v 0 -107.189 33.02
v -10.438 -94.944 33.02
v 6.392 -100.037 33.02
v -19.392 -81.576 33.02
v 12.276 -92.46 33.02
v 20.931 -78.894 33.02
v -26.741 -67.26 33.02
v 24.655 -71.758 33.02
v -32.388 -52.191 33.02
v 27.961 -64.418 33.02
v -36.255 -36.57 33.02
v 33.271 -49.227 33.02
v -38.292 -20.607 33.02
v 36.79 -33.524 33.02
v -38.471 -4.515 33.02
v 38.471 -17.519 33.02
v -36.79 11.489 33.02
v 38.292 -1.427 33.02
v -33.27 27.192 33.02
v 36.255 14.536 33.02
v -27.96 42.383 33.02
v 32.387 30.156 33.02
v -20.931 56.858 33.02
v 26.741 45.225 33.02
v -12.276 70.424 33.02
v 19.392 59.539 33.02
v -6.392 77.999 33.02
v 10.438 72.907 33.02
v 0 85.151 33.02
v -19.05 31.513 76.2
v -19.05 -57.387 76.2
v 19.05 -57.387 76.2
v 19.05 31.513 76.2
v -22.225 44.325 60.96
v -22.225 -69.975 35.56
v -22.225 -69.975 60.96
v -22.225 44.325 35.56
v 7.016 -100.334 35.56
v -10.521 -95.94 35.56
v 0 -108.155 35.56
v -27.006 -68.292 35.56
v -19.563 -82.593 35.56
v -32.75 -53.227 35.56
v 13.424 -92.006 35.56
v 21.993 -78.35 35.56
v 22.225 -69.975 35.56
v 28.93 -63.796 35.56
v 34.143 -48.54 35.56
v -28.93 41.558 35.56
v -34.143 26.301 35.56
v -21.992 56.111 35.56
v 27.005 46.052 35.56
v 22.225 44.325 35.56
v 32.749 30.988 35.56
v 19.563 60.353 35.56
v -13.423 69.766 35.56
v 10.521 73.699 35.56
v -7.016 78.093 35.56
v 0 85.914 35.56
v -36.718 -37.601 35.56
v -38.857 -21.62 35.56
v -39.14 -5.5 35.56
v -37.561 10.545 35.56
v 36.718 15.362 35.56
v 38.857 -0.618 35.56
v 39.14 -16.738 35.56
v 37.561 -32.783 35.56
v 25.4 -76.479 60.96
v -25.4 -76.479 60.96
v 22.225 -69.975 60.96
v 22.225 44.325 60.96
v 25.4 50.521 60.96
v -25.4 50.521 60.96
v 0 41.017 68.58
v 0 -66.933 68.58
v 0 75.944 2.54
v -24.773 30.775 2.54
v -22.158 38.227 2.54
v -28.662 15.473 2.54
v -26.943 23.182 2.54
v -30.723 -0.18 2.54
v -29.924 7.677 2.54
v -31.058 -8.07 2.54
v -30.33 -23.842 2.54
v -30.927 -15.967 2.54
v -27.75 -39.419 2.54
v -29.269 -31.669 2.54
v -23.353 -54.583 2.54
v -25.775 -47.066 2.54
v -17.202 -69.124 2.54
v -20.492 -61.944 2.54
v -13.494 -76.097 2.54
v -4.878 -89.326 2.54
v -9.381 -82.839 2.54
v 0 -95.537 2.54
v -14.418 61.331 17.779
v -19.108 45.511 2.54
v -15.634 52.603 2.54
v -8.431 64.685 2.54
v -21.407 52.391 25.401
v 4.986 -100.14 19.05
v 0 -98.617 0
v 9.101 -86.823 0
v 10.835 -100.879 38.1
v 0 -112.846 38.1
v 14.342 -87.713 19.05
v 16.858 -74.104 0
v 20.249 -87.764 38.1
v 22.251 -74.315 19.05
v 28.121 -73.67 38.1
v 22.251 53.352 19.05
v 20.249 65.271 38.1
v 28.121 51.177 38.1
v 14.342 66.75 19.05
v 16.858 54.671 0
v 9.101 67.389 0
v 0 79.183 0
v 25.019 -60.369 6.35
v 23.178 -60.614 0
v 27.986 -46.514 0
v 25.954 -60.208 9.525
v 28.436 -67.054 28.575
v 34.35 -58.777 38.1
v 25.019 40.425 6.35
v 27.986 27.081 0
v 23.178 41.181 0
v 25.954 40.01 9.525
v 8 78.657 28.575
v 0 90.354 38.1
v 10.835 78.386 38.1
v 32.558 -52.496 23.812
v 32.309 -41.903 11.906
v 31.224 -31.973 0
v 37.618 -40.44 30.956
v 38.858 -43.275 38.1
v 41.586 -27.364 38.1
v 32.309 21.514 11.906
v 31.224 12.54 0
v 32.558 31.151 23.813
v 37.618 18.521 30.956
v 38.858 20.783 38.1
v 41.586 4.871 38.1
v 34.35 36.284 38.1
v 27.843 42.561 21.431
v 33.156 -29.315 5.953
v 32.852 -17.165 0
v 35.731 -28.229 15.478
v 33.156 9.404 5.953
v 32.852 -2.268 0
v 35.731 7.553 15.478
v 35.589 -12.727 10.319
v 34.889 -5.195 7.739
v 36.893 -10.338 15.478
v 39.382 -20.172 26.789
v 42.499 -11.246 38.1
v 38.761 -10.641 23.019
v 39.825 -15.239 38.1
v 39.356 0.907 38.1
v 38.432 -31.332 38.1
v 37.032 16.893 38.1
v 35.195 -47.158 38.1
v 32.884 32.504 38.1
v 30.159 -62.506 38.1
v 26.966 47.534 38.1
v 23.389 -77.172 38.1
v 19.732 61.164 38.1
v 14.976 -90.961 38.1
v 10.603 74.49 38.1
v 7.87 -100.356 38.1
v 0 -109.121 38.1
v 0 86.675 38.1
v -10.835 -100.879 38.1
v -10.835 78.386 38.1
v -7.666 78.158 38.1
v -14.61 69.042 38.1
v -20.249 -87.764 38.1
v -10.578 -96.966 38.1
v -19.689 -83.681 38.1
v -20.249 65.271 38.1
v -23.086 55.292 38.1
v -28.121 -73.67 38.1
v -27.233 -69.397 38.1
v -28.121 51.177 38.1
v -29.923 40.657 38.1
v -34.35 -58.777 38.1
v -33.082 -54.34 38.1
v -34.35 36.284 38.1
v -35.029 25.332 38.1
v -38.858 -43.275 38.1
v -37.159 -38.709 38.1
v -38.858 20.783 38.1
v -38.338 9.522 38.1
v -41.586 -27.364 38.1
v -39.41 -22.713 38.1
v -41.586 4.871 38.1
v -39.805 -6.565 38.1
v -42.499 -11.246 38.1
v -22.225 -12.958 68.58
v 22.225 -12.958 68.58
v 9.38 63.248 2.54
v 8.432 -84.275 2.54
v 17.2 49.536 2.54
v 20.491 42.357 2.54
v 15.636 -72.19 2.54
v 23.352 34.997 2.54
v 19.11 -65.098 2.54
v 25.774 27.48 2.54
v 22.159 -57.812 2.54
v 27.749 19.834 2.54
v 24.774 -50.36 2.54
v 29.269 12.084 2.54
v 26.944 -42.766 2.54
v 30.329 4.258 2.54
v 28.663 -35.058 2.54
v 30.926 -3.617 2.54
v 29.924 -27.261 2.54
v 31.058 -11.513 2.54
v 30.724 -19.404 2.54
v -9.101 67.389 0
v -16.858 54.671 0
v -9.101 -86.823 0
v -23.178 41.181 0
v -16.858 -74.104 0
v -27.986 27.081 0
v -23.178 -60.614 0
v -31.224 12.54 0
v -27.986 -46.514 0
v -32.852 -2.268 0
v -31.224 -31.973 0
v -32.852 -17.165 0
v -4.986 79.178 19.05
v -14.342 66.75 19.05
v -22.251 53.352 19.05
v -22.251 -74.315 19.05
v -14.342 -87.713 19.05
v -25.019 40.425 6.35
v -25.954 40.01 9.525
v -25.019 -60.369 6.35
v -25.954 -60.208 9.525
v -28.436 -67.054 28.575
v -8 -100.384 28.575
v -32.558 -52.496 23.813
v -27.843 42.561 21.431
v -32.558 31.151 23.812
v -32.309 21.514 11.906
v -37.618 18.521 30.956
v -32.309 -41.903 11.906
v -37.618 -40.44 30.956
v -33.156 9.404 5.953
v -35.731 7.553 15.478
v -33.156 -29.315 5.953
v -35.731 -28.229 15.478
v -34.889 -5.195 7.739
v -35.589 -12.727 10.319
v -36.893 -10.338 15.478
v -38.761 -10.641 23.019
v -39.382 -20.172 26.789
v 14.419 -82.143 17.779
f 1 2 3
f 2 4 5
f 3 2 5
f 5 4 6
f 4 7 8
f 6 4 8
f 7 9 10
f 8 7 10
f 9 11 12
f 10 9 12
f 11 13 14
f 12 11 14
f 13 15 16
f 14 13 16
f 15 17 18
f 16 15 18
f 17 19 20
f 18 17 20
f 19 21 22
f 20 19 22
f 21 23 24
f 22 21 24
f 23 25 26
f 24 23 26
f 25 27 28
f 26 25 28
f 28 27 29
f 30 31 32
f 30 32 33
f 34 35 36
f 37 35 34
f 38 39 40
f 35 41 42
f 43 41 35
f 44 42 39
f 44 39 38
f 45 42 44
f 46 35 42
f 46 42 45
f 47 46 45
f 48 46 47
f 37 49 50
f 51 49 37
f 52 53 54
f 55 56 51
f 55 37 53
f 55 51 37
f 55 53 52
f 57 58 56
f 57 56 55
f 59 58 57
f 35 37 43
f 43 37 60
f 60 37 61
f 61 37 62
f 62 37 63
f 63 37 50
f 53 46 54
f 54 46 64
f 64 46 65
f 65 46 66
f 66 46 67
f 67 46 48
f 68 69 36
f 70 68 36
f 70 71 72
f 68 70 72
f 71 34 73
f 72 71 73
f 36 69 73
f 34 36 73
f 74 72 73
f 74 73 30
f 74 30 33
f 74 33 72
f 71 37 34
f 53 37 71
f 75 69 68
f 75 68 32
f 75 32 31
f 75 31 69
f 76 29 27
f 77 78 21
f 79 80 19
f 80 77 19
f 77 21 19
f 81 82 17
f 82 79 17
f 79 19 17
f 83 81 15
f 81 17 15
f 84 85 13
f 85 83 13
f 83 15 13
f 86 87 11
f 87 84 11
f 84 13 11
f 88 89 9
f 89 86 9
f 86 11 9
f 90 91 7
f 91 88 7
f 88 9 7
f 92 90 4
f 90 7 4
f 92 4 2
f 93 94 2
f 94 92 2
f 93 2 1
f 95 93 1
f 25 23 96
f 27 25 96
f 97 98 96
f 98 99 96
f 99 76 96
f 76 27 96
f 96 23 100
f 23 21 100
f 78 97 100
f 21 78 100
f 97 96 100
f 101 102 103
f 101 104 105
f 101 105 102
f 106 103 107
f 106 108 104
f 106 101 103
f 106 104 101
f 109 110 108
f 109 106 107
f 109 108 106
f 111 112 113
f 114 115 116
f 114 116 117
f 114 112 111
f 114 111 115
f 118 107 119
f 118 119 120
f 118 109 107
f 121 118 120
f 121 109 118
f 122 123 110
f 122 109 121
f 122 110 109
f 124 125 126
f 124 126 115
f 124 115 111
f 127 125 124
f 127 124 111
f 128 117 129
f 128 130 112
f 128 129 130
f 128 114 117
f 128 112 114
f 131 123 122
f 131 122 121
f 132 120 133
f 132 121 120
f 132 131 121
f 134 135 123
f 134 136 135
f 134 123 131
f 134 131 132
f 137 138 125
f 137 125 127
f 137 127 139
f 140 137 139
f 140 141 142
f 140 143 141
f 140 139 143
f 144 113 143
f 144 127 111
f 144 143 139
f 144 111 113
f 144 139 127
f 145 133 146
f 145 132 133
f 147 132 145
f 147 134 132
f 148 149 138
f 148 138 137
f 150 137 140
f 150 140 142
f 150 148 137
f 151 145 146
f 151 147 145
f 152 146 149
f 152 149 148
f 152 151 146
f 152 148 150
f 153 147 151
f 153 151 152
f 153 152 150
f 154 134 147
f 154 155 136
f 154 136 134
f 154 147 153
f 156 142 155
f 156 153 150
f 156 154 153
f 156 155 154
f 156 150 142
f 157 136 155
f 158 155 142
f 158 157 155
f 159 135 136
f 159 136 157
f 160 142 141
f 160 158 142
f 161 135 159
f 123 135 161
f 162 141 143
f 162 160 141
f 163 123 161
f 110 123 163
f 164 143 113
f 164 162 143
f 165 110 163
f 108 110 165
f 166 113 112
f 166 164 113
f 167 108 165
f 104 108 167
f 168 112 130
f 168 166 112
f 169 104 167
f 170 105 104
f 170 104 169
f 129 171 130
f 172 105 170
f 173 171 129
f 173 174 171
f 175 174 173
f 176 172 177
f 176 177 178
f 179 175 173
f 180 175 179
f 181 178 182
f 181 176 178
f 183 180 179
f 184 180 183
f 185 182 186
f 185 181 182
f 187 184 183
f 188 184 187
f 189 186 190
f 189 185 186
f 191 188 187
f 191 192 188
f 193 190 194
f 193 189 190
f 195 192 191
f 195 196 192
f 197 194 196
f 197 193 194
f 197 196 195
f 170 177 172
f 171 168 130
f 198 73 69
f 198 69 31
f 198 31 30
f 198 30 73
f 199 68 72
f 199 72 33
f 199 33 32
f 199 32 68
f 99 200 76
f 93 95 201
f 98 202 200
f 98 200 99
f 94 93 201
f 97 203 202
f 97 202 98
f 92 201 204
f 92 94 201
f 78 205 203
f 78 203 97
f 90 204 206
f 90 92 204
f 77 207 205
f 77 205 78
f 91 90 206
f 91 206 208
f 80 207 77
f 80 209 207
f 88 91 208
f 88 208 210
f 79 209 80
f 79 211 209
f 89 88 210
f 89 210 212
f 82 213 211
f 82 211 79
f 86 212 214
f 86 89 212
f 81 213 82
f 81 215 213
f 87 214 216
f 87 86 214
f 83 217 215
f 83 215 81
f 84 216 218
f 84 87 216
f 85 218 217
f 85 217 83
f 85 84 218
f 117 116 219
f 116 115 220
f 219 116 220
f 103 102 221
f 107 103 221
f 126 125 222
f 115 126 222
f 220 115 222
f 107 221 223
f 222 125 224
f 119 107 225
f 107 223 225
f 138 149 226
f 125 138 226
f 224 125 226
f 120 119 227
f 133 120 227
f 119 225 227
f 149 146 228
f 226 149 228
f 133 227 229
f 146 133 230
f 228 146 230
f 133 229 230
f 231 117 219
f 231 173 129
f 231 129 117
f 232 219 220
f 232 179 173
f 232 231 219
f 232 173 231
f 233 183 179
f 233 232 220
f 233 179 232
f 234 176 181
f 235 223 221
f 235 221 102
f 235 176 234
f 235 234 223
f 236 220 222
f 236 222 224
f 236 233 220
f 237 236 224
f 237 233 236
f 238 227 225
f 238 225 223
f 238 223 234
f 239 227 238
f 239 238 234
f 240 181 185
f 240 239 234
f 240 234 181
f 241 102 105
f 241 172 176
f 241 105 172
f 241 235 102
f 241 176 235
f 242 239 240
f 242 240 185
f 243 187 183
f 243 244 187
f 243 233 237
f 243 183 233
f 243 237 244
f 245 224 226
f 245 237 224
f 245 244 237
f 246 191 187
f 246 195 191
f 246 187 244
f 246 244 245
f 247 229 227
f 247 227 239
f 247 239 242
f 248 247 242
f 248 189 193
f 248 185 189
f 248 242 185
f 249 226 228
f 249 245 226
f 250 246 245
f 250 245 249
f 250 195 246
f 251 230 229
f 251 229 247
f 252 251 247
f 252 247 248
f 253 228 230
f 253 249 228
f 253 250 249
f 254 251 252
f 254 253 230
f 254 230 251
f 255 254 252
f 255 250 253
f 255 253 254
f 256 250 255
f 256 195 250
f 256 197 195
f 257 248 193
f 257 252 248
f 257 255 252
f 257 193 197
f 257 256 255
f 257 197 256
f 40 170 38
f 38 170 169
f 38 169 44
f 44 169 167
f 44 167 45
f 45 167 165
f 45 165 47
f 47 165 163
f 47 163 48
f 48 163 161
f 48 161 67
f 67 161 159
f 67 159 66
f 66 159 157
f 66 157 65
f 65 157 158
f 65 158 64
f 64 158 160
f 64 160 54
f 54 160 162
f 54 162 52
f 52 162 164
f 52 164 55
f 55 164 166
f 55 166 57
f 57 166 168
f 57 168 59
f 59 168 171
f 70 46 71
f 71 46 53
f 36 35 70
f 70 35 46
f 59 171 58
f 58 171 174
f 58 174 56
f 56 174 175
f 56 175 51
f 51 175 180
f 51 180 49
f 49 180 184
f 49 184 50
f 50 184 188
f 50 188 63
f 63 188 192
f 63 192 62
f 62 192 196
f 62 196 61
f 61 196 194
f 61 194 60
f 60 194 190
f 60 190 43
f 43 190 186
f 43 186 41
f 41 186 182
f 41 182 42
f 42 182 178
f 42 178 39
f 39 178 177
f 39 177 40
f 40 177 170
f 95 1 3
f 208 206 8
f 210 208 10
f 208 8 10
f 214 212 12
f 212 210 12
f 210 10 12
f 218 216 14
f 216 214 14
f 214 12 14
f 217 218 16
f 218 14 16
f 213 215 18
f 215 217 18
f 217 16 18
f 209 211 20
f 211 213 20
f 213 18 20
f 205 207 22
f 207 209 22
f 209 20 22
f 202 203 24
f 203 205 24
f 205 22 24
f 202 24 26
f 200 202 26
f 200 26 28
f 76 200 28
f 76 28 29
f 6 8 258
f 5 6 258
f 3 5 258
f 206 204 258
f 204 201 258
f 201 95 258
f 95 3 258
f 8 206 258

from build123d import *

# Parameters (mm, degrees)
F4_T     = -2.54
F7_DEPTH = 2.54
F8_W     = 44.45
F8_H     = 114.3
F9_DEPTH = 25.4
F13_W    = 50.8
F13_H    = 127
F11_W    = 38.1
F11_H    = 88.9


with BuildPart() as f3:
    # F0 (on Top) → F3 section 0
    with BuildSketch(Plane.XY):
        with BuildLine():
            ThreePointArc((0, 79.1834323877), (-33.0563178037, -9.7165676123), (0, -98.6165676123))
            ThreePointArc((0, -98.6165676123), (33.0563178037, -9.7165676123), (0, 79.1834323877))
        make_face()
    # F2 (on offset) → F3 section 1
    with BuildSketch(Plane.XY.offset(38.1)):
        with BuildLine():
            ThreePointArc((0, 90.3536503496), (-42.4992821869, -11.2463496504), (0, -112.8463496504))
            ThreePointArc((0, -112.8463496504), (42.4992821869, -11.2463496504), (0, 90.3536503496))
        make_face()
    loft()

    # F4
    f4_openings = [f3.faces().sort_by_distance(p)[0] for p in [
        (0, -11.24635, 38.1),
    ]]
    offset(amount=F4_T, openings=f4_openings)

    # F6 (on offset) → F7 (join)
    with BuildSketch(Plane.XY.offset(35.56)):
        with BuildLine():
            ThreePointArc((0, 87.4059291422), (-40.4220024881, -10.8625479043), (0, -109.1310249507))
            ThreePointArc((0, -109.1310249507), (39.5185295328, -10.8625479043), (0, 87.4059291422))
        make_face()
    extrude(amount=-F7_DEPTH)

    # F8 (on offset) → F9 (join)
    with BuildSketch(Plane.XY.offset(35.56)):
        with Locations((0, -12.8250825944)):
            Rectangle(F8_W, F8_H)
    extrude(amount=F9_DEPTH)

    # F13 (on offset) → F14 section 0
    with BuildSketch(Plane.XY.offset(60.96)):
        with Locations((0, -12.9791411197)):
            Rectangle(F13_W, F13_H)
    # F11 (on offset) → F14 section 1
    with BuildSketch(Plane.XY.offset(76.2)):
        with Locations((0, -12.9365438215)):
            Rectangle(F11_W, F11_H)
    loft()


solid = f3.part
